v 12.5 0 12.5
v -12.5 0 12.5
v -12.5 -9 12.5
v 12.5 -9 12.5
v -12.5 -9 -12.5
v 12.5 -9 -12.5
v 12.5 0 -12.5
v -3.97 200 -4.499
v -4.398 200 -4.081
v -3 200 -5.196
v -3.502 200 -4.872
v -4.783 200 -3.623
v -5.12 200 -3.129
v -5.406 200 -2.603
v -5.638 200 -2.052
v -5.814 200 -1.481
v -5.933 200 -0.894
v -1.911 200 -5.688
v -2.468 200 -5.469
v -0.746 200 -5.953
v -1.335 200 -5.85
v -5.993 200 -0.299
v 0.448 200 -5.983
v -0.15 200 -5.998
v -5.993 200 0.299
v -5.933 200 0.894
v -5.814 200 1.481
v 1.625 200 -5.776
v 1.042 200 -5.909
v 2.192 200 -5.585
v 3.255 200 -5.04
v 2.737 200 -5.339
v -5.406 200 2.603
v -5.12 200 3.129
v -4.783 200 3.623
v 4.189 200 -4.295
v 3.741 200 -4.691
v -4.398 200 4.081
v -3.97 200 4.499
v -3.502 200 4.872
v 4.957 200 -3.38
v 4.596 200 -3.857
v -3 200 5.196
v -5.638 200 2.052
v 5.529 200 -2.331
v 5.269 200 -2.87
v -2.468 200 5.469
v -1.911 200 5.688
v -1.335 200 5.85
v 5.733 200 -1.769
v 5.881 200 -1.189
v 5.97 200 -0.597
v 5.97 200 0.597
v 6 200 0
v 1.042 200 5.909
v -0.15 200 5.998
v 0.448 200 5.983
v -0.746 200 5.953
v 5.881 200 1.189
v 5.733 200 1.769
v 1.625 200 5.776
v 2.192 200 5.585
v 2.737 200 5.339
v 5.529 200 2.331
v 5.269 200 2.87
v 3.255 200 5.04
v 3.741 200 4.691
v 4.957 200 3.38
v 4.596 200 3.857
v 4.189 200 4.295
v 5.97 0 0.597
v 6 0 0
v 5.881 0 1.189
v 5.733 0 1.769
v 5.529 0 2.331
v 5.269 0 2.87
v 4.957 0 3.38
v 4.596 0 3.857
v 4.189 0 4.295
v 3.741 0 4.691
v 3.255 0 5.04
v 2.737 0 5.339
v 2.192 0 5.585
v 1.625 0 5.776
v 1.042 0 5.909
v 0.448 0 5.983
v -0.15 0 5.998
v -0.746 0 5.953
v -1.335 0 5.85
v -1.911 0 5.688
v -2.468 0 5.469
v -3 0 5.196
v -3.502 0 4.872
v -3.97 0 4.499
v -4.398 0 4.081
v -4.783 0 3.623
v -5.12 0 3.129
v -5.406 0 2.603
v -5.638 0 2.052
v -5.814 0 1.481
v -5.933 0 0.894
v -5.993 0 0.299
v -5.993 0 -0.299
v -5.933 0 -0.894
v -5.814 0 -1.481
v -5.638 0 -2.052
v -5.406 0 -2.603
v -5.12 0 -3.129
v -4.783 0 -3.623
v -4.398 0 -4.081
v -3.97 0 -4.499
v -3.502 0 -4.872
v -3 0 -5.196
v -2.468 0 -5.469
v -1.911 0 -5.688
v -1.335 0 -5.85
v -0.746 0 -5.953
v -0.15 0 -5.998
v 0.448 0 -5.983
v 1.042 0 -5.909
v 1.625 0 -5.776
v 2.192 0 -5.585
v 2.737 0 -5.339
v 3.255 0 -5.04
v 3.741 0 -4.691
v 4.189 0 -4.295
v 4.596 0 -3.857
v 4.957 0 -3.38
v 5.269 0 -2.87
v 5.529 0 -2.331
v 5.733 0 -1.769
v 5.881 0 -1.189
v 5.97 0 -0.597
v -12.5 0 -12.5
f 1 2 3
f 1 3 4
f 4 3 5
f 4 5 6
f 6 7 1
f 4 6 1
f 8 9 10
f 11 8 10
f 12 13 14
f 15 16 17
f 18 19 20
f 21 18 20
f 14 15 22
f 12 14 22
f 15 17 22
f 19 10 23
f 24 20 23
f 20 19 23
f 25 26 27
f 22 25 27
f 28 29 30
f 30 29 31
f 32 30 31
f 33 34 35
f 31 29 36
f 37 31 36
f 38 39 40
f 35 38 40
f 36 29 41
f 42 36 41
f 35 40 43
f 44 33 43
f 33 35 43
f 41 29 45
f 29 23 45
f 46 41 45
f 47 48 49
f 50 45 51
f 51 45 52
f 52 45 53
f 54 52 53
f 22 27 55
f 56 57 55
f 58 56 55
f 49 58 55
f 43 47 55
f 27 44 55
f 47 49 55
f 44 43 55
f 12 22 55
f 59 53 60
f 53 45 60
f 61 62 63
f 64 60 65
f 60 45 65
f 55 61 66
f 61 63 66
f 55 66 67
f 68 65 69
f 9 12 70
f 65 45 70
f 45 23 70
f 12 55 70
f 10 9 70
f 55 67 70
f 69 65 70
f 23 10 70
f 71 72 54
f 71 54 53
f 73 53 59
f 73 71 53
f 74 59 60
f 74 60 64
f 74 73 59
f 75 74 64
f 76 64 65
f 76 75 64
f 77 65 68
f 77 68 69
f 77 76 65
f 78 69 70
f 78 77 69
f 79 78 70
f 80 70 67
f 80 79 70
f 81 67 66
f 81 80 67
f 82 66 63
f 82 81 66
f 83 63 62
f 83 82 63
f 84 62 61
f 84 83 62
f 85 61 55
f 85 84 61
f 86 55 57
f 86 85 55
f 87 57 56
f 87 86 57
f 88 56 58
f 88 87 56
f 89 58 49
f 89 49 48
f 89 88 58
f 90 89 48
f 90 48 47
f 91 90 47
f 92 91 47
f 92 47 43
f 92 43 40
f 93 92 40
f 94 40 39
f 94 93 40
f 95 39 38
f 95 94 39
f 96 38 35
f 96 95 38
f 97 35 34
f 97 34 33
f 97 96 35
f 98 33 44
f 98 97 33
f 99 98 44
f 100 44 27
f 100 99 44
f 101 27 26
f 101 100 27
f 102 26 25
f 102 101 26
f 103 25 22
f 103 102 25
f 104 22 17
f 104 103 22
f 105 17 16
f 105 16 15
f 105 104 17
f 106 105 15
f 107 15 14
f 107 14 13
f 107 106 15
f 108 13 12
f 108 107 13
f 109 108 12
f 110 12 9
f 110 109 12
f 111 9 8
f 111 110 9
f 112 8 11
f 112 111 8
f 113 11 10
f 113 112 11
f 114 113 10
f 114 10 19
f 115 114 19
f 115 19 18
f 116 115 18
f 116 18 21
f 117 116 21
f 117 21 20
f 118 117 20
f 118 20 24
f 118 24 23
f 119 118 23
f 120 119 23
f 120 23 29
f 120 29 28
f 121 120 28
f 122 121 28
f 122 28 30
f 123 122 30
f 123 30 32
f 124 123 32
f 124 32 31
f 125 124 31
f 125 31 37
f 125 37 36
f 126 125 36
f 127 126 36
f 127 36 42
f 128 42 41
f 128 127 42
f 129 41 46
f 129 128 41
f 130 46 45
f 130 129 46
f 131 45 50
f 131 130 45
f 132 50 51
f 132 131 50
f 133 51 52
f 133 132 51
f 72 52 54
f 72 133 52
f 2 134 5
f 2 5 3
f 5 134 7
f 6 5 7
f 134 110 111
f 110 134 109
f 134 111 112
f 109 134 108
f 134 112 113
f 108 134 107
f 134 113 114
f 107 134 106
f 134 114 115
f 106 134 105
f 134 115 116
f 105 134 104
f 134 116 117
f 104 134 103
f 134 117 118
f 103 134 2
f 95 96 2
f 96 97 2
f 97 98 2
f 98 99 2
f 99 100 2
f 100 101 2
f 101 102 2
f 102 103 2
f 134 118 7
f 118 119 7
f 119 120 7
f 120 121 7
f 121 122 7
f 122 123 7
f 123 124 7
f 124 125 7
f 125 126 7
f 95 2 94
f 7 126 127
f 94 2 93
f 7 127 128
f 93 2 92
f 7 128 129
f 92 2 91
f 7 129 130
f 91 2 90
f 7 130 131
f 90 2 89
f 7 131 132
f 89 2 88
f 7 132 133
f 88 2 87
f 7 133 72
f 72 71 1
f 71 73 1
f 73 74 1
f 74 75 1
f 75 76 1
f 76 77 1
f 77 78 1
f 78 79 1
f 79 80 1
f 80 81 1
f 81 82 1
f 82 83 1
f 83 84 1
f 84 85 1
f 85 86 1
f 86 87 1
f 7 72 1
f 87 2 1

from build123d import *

# Parameters (mm, degrees)
F0_R     = 6
F1_DEPTH = 200
F2_R     = 6
F0_W     = 25
F0_H     = 25
F3_DEPTH = 9


with BuildPart() as f1:
    # F0 (on Front) → F1 (new body)
    with BuildSketch(Plane.XZ):
        Circle(F0_R)
    extrude(amount=-F1_DEPTH)

    # F2 (on face) + F0 (on Front) → F3 (join)
    with BuildSketch(Plane.XZ):
        Circle(F2_R)
    with BuildSketch(Plane.XZ):
        Rectangle(F0_W, F0_H)
        Circle(F0_R, mode=Mode.SUBTRACT)
    extrude(amount=F3_DEPTH)


solid = f1.part
